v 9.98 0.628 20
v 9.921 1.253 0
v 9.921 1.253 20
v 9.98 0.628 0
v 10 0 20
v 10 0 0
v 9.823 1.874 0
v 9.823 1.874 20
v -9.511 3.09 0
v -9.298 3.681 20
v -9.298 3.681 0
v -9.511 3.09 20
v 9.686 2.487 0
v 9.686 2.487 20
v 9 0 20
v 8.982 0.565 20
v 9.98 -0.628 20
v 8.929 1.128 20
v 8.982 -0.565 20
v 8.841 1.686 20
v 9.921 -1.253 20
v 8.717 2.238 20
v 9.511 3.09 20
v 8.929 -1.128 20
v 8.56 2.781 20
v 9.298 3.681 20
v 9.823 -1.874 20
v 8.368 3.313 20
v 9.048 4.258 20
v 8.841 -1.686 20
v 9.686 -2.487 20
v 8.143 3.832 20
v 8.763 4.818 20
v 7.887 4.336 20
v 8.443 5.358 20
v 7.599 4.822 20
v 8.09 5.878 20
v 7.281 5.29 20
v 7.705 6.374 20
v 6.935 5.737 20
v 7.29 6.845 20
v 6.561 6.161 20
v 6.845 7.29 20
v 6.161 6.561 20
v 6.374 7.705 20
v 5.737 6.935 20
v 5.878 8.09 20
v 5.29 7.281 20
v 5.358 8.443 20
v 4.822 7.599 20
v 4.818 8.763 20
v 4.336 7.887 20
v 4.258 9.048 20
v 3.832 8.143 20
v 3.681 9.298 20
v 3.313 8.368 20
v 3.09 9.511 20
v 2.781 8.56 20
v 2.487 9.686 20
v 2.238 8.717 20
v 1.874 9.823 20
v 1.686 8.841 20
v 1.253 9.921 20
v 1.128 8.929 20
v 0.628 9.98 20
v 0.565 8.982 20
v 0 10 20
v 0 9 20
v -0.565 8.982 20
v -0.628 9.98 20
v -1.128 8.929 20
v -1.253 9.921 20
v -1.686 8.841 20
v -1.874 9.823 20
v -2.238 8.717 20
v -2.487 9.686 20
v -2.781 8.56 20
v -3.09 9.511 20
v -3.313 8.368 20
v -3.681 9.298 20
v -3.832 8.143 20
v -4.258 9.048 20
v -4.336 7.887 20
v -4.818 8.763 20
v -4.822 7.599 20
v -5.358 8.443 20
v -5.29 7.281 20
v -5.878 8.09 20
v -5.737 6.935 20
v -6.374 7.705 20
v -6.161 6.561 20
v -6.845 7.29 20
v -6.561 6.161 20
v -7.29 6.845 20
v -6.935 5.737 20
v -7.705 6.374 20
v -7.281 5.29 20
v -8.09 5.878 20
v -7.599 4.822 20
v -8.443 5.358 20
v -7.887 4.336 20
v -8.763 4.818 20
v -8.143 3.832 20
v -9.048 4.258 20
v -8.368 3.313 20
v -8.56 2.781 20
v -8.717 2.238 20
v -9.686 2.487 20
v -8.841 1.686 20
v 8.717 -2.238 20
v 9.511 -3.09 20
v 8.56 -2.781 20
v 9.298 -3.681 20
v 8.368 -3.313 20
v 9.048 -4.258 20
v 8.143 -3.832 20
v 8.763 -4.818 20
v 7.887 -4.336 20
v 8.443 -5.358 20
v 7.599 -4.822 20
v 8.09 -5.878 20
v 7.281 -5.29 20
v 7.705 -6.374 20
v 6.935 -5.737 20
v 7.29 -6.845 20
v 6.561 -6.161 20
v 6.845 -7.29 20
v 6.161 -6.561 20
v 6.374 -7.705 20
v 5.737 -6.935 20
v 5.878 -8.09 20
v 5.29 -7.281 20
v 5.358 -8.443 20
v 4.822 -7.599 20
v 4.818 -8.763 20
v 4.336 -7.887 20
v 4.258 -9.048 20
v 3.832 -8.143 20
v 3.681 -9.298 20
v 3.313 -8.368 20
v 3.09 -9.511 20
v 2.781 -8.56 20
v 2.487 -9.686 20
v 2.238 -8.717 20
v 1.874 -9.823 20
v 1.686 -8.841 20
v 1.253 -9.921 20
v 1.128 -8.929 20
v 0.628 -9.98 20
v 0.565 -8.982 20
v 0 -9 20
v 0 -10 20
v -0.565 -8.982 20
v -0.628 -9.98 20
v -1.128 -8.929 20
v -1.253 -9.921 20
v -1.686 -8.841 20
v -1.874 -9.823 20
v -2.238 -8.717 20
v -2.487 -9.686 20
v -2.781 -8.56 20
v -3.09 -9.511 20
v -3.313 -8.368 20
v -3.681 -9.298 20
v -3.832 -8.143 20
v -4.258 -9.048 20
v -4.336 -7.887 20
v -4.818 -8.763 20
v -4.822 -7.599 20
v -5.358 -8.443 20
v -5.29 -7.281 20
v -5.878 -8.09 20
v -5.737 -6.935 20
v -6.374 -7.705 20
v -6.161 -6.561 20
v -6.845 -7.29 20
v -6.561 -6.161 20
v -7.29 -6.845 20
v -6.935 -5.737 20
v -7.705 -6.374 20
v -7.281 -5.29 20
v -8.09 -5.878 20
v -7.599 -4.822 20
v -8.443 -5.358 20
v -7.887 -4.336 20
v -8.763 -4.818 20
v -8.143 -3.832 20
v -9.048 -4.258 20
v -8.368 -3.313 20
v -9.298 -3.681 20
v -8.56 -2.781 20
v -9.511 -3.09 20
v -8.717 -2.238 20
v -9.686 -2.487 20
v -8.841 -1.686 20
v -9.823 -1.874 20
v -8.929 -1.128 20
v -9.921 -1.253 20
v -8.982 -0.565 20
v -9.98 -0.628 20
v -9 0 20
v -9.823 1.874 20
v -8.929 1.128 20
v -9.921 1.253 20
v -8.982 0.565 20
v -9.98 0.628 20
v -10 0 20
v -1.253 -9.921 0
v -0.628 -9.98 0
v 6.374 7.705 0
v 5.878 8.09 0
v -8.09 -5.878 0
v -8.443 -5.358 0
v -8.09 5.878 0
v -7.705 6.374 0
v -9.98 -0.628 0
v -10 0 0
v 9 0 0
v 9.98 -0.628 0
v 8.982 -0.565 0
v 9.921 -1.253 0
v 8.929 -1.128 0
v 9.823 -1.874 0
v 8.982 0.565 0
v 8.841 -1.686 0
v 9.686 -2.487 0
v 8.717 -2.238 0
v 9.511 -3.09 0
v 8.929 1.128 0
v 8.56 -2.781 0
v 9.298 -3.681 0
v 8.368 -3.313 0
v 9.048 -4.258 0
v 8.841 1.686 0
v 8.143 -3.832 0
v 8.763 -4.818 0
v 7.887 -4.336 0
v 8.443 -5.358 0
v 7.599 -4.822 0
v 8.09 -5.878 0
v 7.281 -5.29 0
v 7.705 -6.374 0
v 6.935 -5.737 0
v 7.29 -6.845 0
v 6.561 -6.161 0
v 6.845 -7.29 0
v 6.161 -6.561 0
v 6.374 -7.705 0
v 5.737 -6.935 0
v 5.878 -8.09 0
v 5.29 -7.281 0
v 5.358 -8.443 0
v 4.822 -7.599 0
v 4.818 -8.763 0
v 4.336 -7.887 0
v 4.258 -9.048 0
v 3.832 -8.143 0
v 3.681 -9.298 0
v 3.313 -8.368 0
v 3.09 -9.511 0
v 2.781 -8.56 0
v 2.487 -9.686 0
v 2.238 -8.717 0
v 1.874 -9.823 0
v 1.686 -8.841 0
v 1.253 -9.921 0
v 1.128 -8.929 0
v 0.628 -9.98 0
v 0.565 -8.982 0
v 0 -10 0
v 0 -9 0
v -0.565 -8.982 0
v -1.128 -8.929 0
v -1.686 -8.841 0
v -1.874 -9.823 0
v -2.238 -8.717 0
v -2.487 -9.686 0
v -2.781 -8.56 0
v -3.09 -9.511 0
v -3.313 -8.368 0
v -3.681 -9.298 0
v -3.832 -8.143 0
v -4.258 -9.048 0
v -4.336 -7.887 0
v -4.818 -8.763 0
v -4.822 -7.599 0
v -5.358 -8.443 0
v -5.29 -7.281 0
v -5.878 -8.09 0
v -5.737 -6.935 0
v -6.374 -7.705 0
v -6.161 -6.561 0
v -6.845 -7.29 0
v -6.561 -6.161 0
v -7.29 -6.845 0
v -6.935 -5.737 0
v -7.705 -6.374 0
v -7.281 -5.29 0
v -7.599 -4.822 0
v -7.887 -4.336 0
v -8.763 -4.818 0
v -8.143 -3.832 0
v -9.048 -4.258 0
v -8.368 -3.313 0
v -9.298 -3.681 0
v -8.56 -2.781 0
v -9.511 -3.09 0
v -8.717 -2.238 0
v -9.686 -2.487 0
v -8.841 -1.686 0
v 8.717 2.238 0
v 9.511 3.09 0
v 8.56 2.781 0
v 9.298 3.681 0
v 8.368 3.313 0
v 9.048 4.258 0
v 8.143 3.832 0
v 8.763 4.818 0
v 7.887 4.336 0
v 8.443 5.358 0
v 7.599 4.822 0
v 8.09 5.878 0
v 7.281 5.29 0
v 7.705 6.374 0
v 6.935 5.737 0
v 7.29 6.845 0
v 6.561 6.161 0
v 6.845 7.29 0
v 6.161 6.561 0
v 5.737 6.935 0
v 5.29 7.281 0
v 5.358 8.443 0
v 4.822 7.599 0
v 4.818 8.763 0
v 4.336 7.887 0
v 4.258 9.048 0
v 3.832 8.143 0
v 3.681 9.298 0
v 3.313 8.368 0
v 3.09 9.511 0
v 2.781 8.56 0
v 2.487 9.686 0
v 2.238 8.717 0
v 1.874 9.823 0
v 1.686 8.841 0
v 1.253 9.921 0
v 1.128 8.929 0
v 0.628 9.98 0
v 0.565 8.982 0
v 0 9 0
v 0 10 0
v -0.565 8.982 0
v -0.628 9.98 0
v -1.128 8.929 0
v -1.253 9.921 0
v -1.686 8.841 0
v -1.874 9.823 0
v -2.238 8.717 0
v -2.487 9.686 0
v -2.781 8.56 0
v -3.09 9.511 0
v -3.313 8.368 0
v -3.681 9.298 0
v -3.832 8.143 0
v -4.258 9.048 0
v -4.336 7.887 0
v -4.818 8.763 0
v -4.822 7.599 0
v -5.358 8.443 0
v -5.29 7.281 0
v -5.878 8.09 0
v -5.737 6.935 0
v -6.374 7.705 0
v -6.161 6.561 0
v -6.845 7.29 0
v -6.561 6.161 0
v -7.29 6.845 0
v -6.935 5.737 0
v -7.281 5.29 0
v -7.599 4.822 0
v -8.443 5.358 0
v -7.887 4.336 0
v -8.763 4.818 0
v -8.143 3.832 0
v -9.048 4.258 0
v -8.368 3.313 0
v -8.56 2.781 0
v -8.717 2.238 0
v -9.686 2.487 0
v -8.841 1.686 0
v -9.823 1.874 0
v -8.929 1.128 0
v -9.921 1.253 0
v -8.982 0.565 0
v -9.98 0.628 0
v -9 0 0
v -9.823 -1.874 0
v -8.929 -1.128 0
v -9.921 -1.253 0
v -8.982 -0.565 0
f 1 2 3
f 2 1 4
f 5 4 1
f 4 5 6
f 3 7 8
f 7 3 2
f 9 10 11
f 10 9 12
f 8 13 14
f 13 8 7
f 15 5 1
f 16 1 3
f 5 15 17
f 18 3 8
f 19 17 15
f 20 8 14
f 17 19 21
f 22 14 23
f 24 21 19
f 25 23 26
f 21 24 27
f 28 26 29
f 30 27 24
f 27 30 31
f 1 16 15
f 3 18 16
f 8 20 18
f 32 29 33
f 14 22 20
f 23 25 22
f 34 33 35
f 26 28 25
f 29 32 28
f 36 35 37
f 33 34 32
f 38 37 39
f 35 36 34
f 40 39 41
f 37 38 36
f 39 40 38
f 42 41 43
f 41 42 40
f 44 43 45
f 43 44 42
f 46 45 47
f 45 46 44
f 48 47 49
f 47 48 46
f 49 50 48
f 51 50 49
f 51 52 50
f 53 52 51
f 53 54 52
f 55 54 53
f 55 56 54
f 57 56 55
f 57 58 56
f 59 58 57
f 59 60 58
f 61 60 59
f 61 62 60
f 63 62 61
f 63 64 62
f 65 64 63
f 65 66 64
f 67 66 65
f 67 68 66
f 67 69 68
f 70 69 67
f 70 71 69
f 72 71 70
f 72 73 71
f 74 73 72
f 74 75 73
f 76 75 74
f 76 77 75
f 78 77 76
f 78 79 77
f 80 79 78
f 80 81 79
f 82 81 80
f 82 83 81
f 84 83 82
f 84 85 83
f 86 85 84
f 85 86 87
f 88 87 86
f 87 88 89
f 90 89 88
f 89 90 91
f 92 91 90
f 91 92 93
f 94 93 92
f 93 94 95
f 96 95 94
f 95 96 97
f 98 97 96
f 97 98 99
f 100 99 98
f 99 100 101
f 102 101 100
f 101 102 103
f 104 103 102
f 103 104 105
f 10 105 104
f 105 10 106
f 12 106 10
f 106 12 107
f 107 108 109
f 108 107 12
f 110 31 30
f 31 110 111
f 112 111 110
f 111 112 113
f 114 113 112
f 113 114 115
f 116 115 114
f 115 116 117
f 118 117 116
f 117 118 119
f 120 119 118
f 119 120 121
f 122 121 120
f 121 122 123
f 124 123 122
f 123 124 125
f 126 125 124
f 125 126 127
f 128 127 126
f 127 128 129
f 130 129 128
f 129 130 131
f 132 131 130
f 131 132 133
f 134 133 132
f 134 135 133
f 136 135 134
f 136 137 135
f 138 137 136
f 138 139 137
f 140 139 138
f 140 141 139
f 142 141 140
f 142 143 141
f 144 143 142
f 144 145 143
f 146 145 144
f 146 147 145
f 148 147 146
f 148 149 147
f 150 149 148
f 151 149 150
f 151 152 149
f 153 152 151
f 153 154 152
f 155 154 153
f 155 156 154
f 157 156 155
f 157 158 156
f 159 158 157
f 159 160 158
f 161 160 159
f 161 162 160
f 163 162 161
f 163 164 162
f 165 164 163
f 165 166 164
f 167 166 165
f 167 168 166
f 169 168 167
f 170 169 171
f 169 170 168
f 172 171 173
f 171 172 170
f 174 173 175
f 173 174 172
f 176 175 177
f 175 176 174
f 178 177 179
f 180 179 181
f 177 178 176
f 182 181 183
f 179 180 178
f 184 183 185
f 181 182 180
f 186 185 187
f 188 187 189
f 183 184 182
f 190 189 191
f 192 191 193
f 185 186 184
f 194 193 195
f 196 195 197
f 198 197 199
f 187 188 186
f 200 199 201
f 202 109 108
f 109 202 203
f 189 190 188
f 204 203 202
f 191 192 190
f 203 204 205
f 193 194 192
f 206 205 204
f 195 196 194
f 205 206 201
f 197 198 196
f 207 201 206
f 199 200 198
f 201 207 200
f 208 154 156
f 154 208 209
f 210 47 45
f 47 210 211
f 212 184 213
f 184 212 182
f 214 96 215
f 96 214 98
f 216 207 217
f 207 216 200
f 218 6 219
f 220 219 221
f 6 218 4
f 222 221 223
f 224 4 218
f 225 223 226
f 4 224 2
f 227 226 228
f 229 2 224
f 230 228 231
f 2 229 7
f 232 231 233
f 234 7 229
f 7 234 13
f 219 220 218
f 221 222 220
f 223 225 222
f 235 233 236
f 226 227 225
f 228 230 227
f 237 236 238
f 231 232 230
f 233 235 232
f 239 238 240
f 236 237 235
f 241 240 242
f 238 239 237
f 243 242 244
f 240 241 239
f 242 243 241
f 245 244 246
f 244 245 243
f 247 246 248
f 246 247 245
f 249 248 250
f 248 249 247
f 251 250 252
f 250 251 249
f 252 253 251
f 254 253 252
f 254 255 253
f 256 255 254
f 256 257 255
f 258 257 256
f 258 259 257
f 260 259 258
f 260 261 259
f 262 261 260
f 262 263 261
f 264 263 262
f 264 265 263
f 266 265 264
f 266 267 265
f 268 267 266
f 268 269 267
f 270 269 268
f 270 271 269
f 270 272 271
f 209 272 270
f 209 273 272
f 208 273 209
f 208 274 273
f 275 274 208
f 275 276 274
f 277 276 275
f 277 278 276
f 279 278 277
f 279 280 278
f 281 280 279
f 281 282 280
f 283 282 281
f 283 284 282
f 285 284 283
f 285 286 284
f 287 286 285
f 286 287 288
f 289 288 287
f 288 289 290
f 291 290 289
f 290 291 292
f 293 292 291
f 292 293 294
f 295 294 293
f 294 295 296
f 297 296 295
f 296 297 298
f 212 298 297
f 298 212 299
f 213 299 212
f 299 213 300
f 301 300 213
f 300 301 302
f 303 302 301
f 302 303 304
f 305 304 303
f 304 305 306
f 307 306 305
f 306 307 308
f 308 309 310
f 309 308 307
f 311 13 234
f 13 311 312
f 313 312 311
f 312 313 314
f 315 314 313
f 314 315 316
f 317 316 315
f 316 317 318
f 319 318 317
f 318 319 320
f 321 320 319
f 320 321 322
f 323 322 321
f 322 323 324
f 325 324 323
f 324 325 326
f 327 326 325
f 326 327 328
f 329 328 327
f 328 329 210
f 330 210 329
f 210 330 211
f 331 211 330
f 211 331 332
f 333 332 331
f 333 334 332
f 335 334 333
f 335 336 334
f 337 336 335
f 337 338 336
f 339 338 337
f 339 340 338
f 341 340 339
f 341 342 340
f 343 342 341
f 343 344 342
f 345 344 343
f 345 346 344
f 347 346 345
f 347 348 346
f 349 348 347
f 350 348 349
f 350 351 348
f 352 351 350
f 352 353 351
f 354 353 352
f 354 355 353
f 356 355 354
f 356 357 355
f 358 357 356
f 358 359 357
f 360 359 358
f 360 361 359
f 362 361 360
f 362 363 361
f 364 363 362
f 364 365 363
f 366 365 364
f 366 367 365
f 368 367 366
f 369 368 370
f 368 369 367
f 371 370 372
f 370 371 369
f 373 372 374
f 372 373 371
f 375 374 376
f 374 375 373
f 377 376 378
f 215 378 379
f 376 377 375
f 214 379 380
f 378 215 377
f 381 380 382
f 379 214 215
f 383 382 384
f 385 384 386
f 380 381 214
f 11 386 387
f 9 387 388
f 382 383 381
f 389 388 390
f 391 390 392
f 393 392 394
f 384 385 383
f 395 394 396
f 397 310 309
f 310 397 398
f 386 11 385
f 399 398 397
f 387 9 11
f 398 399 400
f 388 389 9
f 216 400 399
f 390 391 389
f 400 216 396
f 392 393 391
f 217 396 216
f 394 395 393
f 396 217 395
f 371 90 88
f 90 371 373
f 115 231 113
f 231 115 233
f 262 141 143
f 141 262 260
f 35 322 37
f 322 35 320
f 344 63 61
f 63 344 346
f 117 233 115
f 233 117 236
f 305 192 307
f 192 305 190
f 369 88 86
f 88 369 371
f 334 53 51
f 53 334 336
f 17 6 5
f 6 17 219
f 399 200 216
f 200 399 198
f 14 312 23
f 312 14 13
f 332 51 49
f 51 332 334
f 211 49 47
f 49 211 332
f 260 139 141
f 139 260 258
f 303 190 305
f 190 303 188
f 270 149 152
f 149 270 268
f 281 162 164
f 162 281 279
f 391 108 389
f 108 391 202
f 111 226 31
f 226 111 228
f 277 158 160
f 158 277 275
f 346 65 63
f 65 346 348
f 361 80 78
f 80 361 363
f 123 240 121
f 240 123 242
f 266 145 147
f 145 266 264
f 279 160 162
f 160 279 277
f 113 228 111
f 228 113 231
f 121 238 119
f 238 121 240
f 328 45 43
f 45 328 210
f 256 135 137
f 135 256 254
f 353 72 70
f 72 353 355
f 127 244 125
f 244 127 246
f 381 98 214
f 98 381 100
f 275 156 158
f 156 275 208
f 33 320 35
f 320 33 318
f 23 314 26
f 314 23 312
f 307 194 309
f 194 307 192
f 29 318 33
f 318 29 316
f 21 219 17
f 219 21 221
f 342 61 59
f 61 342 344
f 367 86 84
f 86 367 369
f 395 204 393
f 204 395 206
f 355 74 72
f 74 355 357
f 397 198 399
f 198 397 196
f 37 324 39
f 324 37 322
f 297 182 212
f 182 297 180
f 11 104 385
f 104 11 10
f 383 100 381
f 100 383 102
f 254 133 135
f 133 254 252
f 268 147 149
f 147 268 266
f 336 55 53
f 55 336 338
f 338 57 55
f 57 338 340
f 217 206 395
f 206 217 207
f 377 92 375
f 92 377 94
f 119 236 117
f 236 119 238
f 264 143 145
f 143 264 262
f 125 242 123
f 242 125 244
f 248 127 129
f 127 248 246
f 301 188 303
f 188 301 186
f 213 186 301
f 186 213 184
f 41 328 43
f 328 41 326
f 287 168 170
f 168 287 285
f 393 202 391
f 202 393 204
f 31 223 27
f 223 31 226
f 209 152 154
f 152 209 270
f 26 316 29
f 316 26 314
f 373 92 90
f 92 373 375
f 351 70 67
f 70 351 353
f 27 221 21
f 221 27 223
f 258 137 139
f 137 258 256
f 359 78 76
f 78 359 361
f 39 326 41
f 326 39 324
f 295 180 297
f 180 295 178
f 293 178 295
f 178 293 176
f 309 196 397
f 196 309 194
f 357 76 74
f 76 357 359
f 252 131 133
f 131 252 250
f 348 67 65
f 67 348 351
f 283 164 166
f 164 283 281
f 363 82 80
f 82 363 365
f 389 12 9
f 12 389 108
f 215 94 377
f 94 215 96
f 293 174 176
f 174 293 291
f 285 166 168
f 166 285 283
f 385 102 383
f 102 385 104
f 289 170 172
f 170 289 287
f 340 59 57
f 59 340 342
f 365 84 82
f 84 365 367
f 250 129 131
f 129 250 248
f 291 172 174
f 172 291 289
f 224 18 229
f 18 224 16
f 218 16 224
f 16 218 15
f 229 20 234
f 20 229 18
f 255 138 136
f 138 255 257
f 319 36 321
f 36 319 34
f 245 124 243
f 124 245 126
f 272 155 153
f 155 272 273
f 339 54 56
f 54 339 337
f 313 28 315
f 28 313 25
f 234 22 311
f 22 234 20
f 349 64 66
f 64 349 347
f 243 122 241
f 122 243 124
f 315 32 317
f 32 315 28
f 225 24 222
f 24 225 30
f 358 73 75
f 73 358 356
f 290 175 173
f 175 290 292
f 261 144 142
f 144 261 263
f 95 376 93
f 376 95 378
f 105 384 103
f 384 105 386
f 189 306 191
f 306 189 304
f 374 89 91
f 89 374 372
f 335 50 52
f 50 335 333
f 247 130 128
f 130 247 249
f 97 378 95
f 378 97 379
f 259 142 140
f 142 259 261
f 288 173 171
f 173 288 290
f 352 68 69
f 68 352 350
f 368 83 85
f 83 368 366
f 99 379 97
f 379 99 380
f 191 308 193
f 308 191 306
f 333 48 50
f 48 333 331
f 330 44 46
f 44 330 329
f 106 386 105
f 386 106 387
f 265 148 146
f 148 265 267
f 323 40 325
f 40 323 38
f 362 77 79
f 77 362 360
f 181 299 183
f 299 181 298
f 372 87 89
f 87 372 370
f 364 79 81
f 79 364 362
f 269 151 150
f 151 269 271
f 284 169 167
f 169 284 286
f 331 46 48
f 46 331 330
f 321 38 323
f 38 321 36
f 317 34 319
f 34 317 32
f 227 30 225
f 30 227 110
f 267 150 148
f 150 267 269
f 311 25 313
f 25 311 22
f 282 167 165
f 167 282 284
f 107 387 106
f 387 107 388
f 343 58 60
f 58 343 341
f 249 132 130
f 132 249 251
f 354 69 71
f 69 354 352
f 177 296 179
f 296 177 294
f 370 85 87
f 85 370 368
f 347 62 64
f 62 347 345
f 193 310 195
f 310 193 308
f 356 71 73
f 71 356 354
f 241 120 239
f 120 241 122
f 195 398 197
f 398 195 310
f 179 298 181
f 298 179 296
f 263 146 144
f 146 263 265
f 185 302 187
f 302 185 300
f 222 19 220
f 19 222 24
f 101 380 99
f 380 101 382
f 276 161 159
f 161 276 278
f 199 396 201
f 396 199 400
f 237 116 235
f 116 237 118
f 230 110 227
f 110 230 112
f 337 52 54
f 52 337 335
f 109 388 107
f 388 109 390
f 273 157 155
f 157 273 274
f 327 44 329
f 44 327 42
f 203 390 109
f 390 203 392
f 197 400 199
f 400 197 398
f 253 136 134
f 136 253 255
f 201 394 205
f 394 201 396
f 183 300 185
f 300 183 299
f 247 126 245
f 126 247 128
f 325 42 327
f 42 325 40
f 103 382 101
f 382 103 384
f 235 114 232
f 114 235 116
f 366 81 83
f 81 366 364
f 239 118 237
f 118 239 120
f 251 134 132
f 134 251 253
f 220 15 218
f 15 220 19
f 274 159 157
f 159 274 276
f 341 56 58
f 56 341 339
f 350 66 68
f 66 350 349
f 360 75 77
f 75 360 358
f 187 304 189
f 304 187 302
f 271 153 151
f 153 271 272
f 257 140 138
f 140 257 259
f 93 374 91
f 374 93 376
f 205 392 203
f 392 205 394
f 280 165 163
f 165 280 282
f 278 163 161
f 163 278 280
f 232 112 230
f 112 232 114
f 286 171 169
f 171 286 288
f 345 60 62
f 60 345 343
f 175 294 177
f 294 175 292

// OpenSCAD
// file: ../configurations/global.scad
knob_facade_a_piece_height = 20;
knob_facade_a_piece_diameter = 20;
knob_facade_a_piece_wall_thickness = 2;

knob_facade_b_piece_height = 20;
knob_facade_b_piece_diameter = 20;
knob_facade_b_piece_wall_thickness = 2;
// main file
include <../configurations/global.scad>;

module knobFacadeBPiece(
    height = knob_facade_b_piece_height,
    diameter = knob_facade_b_piece_diameter,
    wall_thickness = knob_facade_b_piece_wall_thickness
) {
    difference() {
        cylinder(h = height, d = diameter, $fn=100);
        translate([0, 0, -1])
        cylinder(h = height + 2, d = diameter - wall_thickness, $fn=100);
    }
}

knobFacadeBPiece();
